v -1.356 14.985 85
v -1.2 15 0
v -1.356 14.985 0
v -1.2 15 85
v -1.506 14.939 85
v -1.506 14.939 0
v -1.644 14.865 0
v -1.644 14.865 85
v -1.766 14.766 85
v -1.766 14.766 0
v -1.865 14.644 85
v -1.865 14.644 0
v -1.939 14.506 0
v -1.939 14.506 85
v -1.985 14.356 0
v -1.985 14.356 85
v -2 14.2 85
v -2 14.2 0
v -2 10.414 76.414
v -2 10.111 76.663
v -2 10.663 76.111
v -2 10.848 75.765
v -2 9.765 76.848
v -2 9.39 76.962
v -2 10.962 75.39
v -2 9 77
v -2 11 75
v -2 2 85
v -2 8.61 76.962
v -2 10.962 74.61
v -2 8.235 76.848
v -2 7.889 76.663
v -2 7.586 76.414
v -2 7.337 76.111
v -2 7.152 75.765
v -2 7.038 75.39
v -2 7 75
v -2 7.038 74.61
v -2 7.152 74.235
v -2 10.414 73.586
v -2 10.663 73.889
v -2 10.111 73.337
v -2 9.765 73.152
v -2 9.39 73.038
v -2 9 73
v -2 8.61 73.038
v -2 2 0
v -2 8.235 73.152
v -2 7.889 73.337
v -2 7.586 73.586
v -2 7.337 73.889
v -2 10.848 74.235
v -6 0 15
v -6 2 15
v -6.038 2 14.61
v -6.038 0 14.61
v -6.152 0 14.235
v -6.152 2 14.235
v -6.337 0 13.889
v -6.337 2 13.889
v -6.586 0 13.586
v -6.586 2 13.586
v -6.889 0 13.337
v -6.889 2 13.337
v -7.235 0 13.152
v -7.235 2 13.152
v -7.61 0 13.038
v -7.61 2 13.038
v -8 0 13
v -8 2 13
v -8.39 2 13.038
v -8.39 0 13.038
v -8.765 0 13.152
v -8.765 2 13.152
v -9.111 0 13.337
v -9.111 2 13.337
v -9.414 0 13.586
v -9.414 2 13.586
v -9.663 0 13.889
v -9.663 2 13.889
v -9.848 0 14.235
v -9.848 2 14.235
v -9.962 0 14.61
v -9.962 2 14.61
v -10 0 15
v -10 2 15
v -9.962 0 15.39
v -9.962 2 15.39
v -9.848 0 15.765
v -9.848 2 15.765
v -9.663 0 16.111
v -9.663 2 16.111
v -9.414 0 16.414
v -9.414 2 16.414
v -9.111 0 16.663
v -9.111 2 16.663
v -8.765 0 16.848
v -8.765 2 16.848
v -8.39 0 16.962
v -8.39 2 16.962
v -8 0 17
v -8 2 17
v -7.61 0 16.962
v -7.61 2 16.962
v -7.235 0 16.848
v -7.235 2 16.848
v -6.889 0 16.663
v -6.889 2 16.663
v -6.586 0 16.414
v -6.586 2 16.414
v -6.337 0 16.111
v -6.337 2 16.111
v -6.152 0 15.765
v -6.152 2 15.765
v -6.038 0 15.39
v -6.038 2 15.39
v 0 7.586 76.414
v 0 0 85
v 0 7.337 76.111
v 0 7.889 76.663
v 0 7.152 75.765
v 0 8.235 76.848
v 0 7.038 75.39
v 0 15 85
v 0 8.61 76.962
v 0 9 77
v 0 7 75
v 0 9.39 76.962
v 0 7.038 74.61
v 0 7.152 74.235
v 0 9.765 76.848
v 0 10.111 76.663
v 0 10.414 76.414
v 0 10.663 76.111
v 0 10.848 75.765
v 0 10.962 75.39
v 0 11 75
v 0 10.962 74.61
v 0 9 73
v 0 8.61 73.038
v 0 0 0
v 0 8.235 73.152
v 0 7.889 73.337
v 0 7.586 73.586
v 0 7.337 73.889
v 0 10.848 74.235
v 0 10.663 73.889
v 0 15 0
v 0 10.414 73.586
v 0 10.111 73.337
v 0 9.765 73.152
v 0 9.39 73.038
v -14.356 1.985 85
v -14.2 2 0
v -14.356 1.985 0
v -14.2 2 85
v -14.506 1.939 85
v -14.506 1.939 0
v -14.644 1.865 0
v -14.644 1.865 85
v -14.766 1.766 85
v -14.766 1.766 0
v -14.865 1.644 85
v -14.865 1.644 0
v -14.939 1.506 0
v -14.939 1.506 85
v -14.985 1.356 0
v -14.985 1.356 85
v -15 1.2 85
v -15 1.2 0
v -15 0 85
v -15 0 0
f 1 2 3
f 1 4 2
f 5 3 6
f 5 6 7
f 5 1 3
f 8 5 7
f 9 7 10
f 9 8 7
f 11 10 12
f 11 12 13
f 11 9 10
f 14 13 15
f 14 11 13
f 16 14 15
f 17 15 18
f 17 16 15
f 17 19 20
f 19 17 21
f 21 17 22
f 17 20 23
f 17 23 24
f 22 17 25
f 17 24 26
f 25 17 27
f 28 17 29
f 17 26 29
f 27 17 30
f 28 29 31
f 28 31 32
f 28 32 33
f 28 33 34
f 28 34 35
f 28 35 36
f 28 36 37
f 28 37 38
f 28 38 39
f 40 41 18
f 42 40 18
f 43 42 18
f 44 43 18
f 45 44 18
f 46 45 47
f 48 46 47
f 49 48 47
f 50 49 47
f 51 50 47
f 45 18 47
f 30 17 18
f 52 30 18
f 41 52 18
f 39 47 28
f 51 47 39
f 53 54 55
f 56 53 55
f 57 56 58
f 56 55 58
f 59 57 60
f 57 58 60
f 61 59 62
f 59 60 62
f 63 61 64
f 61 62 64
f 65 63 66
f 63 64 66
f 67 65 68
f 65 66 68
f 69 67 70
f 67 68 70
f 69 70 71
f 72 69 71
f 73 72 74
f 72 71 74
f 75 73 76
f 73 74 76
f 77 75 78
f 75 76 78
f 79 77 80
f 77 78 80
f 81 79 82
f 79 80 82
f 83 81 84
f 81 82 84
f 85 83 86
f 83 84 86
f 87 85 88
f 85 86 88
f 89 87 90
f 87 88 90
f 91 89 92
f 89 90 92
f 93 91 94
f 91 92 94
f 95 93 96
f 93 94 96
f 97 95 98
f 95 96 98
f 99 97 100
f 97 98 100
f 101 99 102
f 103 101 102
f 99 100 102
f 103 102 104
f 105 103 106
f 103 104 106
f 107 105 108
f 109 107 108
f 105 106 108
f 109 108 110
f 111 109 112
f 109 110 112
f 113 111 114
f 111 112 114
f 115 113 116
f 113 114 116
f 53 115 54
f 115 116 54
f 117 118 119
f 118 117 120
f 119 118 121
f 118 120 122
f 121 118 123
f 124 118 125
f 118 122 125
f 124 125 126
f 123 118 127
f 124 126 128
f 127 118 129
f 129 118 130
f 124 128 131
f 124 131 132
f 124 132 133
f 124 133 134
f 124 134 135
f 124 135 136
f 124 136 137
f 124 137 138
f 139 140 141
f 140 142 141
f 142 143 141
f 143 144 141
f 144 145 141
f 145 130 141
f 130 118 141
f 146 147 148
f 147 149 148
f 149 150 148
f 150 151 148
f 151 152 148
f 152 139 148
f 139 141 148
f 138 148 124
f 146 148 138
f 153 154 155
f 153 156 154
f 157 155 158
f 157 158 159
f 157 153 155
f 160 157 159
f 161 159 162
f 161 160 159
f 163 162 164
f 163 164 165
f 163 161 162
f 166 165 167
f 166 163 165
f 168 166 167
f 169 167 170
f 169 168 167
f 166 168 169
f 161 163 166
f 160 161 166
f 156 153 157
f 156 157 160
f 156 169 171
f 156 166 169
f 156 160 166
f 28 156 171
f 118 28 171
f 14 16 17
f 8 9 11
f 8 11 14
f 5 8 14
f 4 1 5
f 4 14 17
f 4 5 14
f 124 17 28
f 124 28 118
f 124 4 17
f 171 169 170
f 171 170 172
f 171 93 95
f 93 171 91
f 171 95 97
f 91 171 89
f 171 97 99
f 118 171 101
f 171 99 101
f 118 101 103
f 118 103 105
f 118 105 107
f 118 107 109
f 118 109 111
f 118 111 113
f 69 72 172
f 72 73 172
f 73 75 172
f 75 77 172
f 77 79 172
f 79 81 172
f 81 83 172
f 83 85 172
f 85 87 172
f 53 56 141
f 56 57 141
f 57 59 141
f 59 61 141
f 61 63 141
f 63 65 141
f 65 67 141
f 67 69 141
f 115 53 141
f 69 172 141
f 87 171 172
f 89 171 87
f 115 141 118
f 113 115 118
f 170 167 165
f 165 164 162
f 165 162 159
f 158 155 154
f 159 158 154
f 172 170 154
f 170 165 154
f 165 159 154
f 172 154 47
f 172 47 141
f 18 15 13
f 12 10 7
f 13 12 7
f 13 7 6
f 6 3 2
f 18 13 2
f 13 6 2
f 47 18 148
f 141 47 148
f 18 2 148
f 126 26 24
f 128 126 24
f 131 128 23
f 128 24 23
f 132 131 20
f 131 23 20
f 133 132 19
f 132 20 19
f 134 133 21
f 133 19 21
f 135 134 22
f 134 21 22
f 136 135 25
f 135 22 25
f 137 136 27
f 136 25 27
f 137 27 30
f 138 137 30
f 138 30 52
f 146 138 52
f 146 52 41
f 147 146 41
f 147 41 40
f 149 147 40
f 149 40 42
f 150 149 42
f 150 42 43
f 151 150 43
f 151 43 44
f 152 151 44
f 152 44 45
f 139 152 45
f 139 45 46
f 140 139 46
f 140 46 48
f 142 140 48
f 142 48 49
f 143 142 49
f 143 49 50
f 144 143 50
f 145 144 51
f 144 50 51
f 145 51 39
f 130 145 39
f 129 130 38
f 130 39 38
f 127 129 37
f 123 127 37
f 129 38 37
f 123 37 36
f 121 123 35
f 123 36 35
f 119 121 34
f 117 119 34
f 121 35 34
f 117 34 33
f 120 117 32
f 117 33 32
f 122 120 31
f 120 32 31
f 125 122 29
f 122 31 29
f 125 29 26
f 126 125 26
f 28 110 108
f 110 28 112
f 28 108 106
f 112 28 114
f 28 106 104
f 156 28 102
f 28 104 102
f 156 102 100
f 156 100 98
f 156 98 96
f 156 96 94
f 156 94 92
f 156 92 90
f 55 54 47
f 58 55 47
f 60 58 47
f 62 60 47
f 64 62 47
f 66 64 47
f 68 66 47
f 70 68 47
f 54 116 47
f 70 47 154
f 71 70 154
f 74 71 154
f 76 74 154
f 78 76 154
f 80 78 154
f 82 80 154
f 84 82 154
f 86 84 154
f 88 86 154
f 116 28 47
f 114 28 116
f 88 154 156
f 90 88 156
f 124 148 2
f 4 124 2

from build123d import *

# Parameters (mm, degrees)
EXTRUDE_1_DEPTH     = 85
FILLET_1_R          = 0.8
SKETCH_2_R          = 2
CUT_EXTRUDE_1_DEPTH = 2
SKETCH_3_R          = 2
CUT_EXTRUDE_2_DEPTH = 400


with BuildPart() as part:
    # 草图1 → 凸台-拉伸1 (new body)
    with BuildSketch(Plane.XY):
        Polygon((0, 0), (0, 15), (-2, 15), (-2, 2), (-15, 2), (-15, 0), align=None)
    extrude(amount=EXTRUDE_1_DEPTH)

    # 圆角1
    fillet_1_edges = [part.edges().sort_by_distance(p)[0] for p in [
        (-15, 2, 42.5),
        (-2, 15, 42.5),
    ]]
    fillet(fillet_1_edges, radius=FILLET_1_R)

    # 草图2 → 切除-拉伸1 (cut)
    with BuildSketch(Plane(origin=(0, 2, 0), x_dir=(1, 0, 0), z_dir=(0, 1, 0))):
        with Locations((-8, -15)):
            Circle(SKETCH_2_R)
    extrude(amount=-CUT_EXTRUDE_1_DEPTH, mode=Mode.SUBTRACT)

    # 草图3 → 切除-拉伸2 (cut)
    with BuildSketch(Plane.ZY.offset(2)):
        with Locations((75, 9)):
            Circle(SKETCH_3_R)
    extrude(amount=-CUT_EXTRUDE_2_DEPTH, mode=Mode.SUBTRACT)


solid = part.part
